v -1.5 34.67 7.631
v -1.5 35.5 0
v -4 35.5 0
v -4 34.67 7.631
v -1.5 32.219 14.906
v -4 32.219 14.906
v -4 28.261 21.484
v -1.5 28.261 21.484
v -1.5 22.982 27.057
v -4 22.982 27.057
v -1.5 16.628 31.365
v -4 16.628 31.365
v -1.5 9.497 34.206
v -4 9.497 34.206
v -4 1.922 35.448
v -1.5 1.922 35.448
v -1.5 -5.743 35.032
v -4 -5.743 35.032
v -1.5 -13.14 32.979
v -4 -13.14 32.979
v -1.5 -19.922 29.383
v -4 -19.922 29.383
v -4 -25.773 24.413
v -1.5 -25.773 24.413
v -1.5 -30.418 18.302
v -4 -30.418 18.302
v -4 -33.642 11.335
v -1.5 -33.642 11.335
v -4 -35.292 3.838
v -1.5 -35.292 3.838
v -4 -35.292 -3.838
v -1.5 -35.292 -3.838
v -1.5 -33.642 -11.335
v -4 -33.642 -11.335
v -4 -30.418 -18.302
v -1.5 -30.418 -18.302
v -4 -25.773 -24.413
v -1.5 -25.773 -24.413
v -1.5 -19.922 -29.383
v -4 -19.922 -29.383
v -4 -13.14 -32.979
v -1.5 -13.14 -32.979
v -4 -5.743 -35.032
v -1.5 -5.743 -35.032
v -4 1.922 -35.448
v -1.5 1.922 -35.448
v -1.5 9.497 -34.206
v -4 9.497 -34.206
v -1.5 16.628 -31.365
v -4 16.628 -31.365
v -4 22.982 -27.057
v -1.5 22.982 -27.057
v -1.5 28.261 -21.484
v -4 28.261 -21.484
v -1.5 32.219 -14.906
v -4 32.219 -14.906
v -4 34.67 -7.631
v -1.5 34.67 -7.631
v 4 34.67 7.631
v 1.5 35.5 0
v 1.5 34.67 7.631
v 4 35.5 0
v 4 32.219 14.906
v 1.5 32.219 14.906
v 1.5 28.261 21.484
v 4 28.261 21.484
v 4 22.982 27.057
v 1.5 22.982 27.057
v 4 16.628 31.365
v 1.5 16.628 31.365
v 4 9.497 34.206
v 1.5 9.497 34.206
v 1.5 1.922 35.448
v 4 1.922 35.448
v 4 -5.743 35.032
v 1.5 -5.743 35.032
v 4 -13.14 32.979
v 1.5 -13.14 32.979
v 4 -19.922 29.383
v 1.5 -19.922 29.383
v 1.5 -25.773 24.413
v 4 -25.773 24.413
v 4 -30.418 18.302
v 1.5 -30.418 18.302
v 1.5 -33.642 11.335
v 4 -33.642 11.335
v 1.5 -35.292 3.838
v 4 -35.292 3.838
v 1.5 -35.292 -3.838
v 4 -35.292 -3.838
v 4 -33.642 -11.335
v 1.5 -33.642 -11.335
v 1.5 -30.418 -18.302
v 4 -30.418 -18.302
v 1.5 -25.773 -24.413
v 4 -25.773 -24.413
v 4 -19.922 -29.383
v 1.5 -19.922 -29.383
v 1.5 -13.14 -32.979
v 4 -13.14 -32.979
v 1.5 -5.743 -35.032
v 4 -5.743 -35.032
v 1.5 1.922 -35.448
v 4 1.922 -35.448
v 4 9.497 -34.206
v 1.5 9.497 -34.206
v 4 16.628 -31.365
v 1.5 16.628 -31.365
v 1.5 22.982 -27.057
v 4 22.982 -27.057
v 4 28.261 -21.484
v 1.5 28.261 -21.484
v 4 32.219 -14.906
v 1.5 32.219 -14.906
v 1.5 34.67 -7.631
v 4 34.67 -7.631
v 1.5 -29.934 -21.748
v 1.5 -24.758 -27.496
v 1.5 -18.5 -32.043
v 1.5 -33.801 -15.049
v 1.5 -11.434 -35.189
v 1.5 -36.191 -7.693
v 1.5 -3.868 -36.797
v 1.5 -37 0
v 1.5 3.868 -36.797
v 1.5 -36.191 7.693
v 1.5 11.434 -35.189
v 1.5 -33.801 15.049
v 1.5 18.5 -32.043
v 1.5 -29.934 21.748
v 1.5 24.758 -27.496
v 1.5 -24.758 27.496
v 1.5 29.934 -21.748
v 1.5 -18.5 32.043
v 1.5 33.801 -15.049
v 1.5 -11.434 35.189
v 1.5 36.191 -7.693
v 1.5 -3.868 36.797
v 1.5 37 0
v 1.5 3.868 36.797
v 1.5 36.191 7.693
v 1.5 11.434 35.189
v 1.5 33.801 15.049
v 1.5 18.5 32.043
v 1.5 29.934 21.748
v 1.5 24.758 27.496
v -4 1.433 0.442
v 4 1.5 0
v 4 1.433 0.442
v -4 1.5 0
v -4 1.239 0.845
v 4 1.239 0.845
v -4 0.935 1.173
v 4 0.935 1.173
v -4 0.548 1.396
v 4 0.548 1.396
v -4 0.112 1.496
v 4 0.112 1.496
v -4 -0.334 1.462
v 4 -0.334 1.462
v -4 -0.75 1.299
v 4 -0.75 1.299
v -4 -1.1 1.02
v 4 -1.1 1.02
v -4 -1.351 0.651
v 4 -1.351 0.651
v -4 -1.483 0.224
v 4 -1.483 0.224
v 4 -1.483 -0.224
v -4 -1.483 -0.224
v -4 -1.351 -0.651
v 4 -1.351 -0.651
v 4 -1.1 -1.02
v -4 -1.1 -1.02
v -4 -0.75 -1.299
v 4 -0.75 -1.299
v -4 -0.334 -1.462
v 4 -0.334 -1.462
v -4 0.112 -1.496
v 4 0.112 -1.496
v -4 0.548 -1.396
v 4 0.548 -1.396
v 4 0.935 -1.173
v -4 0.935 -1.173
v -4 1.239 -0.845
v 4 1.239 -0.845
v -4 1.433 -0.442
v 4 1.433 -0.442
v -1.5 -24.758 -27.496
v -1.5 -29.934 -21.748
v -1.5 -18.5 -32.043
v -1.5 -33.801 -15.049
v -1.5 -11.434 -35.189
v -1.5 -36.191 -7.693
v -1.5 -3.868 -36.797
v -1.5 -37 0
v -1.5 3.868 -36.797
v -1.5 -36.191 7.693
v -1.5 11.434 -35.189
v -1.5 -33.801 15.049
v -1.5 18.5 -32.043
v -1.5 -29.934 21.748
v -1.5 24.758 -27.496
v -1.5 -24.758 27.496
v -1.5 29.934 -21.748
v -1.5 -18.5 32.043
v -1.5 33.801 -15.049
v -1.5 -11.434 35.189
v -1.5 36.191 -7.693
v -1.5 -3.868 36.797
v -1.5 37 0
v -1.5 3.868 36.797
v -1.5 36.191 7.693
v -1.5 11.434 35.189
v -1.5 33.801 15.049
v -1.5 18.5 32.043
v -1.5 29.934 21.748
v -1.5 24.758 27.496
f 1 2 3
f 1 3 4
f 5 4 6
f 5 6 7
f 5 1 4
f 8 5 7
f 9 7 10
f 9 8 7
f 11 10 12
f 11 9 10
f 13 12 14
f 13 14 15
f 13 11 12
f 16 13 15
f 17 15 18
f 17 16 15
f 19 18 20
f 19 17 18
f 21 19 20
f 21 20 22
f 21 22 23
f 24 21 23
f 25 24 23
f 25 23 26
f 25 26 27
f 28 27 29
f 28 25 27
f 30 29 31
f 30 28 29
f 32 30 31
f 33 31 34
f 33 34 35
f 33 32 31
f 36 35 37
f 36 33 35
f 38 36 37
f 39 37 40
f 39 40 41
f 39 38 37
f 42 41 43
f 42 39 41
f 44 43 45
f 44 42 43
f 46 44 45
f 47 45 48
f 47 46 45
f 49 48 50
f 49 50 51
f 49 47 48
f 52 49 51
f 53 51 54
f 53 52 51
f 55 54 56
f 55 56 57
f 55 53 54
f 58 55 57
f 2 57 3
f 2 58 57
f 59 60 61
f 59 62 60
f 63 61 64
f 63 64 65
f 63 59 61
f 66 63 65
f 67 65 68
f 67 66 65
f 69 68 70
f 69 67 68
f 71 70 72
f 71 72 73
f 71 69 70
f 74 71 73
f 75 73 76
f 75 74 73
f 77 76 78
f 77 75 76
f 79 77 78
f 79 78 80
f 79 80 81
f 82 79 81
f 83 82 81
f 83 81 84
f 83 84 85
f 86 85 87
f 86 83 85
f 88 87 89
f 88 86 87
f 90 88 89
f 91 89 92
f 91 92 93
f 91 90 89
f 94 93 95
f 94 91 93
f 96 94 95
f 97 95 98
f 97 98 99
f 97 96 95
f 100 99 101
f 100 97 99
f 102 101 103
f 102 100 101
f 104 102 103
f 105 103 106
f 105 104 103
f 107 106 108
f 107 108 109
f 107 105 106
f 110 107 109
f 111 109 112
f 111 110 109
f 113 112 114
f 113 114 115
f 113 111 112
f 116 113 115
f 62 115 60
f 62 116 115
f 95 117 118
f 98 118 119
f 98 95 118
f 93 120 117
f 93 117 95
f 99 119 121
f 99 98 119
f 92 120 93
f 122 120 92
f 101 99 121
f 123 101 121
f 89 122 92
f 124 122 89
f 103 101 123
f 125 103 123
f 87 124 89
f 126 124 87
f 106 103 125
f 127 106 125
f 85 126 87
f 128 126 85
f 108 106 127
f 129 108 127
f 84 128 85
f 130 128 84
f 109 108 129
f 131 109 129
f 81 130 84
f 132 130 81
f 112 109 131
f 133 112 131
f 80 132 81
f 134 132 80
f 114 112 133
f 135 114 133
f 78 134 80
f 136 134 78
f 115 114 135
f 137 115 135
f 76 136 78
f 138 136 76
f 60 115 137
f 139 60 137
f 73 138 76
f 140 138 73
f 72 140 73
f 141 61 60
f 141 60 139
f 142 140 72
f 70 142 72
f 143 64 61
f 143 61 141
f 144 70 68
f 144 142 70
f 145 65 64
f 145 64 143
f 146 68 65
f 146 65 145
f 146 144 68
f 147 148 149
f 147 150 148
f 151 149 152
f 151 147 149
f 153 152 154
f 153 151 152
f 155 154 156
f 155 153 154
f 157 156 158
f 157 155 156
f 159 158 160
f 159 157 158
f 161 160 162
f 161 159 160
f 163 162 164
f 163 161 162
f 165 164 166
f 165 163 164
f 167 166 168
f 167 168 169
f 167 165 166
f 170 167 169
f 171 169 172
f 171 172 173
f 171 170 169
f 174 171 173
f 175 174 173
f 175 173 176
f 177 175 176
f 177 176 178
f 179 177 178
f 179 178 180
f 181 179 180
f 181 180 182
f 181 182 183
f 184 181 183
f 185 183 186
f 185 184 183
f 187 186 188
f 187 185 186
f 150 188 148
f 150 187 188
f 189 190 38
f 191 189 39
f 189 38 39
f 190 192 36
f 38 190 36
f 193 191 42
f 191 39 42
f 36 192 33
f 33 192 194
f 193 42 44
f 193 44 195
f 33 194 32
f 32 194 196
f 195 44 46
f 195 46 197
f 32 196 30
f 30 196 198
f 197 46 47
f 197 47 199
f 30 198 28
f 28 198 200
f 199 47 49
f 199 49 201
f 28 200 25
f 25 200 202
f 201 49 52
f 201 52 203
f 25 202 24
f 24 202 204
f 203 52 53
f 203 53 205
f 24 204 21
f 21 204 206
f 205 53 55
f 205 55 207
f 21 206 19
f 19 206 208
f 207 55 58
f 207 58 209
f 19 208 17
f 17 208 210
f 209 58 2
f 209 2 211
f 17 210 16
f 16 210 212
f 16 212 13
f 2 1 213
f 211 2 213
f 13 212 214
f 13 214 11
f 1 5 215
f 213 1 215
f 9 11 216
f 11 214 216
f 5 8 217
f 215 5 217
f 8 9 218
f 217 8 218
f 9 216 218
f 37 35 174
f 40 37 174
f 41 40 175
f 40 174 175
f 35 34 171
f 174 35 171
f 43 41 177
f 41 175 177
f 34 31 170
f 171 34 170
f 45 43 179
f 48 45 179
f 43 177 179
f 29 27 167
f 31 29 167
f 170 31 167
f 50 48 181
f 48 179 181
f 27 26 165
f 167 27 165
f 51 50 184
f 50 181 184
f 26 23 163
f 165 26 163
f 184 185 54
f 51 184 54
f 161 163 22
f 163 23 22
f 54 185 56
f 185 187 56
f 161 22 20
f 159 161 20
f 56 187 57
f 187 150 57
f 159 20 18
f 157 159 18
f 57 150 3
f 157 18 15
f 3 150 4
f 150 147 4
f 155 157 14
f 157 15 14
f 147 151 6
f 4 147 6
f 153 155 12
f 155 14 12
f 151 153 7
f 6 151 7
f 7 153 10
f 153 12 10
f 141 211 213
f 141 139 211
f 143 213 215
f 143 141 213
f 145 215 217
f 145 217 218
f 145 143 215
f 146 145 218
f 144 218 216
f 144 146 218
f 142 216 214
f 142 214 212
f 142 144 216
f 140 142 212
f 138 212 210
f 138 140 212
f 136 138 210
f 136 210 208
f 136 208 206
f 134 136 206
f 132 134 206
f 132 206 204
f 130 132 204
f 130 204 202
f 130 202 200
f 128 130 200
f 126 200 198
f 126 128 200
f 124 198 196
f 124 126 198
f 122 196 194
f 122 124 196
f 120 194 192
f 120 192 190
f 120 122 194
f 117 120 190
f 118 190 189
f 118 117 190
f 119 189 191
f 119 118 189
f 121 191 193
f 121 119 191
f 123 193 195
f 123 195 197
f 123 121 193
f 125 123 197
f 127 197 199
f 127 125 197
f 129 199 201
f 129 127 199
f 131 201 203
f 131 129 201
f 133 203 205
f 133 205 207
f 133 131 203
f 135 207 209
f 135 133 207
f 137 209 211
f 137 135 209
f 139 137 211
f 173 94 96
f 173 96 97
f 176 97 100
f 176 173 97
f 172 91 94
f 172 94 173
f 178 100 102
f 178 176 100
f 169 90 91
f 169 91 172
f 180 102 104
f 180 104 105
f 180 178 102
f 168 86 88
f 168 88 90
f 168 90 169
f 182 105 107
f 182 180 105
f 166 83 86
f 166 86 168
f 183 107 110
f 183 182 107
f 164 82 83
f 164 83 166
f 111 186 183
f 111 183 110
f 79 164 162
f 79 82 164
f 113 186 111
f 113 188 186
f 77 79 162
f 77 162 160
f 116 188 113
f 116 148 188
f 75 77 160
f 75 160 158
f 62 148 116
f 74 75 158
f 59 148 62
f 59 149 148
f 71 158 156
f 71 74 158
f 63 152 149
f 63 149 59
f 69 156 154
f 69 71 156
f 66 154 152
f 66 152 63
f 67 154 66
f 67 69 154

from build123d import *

# Parameters (mm, degrees)
F0_R     = 37
F0_R_2   = 35.5
F1_DEPTH = 1.5
F0_R_3   = 1.5
F2_DEPTH = 4


with BuildPart() as f1:
    # F0 (on Right) → F1 (new body, symmetric)
    with BuildSketch(Plane.YZ):
        Circle(F0_R)
        Circle(F0_R_2, mode=Mode.SUBTRACT)
    extrude(amount=F1_DEPTH, both=True)

    # F0 (on Right) → F2 (join, symmetric)
    with BuildSketch(Plane.YZ):
        Circle(F0_R_2)
        Circle(F0_R_3, mode=Mode.SUBTRACT)
    extrude(amount=F2_DEPTH, both=True)


solid = f1.part
